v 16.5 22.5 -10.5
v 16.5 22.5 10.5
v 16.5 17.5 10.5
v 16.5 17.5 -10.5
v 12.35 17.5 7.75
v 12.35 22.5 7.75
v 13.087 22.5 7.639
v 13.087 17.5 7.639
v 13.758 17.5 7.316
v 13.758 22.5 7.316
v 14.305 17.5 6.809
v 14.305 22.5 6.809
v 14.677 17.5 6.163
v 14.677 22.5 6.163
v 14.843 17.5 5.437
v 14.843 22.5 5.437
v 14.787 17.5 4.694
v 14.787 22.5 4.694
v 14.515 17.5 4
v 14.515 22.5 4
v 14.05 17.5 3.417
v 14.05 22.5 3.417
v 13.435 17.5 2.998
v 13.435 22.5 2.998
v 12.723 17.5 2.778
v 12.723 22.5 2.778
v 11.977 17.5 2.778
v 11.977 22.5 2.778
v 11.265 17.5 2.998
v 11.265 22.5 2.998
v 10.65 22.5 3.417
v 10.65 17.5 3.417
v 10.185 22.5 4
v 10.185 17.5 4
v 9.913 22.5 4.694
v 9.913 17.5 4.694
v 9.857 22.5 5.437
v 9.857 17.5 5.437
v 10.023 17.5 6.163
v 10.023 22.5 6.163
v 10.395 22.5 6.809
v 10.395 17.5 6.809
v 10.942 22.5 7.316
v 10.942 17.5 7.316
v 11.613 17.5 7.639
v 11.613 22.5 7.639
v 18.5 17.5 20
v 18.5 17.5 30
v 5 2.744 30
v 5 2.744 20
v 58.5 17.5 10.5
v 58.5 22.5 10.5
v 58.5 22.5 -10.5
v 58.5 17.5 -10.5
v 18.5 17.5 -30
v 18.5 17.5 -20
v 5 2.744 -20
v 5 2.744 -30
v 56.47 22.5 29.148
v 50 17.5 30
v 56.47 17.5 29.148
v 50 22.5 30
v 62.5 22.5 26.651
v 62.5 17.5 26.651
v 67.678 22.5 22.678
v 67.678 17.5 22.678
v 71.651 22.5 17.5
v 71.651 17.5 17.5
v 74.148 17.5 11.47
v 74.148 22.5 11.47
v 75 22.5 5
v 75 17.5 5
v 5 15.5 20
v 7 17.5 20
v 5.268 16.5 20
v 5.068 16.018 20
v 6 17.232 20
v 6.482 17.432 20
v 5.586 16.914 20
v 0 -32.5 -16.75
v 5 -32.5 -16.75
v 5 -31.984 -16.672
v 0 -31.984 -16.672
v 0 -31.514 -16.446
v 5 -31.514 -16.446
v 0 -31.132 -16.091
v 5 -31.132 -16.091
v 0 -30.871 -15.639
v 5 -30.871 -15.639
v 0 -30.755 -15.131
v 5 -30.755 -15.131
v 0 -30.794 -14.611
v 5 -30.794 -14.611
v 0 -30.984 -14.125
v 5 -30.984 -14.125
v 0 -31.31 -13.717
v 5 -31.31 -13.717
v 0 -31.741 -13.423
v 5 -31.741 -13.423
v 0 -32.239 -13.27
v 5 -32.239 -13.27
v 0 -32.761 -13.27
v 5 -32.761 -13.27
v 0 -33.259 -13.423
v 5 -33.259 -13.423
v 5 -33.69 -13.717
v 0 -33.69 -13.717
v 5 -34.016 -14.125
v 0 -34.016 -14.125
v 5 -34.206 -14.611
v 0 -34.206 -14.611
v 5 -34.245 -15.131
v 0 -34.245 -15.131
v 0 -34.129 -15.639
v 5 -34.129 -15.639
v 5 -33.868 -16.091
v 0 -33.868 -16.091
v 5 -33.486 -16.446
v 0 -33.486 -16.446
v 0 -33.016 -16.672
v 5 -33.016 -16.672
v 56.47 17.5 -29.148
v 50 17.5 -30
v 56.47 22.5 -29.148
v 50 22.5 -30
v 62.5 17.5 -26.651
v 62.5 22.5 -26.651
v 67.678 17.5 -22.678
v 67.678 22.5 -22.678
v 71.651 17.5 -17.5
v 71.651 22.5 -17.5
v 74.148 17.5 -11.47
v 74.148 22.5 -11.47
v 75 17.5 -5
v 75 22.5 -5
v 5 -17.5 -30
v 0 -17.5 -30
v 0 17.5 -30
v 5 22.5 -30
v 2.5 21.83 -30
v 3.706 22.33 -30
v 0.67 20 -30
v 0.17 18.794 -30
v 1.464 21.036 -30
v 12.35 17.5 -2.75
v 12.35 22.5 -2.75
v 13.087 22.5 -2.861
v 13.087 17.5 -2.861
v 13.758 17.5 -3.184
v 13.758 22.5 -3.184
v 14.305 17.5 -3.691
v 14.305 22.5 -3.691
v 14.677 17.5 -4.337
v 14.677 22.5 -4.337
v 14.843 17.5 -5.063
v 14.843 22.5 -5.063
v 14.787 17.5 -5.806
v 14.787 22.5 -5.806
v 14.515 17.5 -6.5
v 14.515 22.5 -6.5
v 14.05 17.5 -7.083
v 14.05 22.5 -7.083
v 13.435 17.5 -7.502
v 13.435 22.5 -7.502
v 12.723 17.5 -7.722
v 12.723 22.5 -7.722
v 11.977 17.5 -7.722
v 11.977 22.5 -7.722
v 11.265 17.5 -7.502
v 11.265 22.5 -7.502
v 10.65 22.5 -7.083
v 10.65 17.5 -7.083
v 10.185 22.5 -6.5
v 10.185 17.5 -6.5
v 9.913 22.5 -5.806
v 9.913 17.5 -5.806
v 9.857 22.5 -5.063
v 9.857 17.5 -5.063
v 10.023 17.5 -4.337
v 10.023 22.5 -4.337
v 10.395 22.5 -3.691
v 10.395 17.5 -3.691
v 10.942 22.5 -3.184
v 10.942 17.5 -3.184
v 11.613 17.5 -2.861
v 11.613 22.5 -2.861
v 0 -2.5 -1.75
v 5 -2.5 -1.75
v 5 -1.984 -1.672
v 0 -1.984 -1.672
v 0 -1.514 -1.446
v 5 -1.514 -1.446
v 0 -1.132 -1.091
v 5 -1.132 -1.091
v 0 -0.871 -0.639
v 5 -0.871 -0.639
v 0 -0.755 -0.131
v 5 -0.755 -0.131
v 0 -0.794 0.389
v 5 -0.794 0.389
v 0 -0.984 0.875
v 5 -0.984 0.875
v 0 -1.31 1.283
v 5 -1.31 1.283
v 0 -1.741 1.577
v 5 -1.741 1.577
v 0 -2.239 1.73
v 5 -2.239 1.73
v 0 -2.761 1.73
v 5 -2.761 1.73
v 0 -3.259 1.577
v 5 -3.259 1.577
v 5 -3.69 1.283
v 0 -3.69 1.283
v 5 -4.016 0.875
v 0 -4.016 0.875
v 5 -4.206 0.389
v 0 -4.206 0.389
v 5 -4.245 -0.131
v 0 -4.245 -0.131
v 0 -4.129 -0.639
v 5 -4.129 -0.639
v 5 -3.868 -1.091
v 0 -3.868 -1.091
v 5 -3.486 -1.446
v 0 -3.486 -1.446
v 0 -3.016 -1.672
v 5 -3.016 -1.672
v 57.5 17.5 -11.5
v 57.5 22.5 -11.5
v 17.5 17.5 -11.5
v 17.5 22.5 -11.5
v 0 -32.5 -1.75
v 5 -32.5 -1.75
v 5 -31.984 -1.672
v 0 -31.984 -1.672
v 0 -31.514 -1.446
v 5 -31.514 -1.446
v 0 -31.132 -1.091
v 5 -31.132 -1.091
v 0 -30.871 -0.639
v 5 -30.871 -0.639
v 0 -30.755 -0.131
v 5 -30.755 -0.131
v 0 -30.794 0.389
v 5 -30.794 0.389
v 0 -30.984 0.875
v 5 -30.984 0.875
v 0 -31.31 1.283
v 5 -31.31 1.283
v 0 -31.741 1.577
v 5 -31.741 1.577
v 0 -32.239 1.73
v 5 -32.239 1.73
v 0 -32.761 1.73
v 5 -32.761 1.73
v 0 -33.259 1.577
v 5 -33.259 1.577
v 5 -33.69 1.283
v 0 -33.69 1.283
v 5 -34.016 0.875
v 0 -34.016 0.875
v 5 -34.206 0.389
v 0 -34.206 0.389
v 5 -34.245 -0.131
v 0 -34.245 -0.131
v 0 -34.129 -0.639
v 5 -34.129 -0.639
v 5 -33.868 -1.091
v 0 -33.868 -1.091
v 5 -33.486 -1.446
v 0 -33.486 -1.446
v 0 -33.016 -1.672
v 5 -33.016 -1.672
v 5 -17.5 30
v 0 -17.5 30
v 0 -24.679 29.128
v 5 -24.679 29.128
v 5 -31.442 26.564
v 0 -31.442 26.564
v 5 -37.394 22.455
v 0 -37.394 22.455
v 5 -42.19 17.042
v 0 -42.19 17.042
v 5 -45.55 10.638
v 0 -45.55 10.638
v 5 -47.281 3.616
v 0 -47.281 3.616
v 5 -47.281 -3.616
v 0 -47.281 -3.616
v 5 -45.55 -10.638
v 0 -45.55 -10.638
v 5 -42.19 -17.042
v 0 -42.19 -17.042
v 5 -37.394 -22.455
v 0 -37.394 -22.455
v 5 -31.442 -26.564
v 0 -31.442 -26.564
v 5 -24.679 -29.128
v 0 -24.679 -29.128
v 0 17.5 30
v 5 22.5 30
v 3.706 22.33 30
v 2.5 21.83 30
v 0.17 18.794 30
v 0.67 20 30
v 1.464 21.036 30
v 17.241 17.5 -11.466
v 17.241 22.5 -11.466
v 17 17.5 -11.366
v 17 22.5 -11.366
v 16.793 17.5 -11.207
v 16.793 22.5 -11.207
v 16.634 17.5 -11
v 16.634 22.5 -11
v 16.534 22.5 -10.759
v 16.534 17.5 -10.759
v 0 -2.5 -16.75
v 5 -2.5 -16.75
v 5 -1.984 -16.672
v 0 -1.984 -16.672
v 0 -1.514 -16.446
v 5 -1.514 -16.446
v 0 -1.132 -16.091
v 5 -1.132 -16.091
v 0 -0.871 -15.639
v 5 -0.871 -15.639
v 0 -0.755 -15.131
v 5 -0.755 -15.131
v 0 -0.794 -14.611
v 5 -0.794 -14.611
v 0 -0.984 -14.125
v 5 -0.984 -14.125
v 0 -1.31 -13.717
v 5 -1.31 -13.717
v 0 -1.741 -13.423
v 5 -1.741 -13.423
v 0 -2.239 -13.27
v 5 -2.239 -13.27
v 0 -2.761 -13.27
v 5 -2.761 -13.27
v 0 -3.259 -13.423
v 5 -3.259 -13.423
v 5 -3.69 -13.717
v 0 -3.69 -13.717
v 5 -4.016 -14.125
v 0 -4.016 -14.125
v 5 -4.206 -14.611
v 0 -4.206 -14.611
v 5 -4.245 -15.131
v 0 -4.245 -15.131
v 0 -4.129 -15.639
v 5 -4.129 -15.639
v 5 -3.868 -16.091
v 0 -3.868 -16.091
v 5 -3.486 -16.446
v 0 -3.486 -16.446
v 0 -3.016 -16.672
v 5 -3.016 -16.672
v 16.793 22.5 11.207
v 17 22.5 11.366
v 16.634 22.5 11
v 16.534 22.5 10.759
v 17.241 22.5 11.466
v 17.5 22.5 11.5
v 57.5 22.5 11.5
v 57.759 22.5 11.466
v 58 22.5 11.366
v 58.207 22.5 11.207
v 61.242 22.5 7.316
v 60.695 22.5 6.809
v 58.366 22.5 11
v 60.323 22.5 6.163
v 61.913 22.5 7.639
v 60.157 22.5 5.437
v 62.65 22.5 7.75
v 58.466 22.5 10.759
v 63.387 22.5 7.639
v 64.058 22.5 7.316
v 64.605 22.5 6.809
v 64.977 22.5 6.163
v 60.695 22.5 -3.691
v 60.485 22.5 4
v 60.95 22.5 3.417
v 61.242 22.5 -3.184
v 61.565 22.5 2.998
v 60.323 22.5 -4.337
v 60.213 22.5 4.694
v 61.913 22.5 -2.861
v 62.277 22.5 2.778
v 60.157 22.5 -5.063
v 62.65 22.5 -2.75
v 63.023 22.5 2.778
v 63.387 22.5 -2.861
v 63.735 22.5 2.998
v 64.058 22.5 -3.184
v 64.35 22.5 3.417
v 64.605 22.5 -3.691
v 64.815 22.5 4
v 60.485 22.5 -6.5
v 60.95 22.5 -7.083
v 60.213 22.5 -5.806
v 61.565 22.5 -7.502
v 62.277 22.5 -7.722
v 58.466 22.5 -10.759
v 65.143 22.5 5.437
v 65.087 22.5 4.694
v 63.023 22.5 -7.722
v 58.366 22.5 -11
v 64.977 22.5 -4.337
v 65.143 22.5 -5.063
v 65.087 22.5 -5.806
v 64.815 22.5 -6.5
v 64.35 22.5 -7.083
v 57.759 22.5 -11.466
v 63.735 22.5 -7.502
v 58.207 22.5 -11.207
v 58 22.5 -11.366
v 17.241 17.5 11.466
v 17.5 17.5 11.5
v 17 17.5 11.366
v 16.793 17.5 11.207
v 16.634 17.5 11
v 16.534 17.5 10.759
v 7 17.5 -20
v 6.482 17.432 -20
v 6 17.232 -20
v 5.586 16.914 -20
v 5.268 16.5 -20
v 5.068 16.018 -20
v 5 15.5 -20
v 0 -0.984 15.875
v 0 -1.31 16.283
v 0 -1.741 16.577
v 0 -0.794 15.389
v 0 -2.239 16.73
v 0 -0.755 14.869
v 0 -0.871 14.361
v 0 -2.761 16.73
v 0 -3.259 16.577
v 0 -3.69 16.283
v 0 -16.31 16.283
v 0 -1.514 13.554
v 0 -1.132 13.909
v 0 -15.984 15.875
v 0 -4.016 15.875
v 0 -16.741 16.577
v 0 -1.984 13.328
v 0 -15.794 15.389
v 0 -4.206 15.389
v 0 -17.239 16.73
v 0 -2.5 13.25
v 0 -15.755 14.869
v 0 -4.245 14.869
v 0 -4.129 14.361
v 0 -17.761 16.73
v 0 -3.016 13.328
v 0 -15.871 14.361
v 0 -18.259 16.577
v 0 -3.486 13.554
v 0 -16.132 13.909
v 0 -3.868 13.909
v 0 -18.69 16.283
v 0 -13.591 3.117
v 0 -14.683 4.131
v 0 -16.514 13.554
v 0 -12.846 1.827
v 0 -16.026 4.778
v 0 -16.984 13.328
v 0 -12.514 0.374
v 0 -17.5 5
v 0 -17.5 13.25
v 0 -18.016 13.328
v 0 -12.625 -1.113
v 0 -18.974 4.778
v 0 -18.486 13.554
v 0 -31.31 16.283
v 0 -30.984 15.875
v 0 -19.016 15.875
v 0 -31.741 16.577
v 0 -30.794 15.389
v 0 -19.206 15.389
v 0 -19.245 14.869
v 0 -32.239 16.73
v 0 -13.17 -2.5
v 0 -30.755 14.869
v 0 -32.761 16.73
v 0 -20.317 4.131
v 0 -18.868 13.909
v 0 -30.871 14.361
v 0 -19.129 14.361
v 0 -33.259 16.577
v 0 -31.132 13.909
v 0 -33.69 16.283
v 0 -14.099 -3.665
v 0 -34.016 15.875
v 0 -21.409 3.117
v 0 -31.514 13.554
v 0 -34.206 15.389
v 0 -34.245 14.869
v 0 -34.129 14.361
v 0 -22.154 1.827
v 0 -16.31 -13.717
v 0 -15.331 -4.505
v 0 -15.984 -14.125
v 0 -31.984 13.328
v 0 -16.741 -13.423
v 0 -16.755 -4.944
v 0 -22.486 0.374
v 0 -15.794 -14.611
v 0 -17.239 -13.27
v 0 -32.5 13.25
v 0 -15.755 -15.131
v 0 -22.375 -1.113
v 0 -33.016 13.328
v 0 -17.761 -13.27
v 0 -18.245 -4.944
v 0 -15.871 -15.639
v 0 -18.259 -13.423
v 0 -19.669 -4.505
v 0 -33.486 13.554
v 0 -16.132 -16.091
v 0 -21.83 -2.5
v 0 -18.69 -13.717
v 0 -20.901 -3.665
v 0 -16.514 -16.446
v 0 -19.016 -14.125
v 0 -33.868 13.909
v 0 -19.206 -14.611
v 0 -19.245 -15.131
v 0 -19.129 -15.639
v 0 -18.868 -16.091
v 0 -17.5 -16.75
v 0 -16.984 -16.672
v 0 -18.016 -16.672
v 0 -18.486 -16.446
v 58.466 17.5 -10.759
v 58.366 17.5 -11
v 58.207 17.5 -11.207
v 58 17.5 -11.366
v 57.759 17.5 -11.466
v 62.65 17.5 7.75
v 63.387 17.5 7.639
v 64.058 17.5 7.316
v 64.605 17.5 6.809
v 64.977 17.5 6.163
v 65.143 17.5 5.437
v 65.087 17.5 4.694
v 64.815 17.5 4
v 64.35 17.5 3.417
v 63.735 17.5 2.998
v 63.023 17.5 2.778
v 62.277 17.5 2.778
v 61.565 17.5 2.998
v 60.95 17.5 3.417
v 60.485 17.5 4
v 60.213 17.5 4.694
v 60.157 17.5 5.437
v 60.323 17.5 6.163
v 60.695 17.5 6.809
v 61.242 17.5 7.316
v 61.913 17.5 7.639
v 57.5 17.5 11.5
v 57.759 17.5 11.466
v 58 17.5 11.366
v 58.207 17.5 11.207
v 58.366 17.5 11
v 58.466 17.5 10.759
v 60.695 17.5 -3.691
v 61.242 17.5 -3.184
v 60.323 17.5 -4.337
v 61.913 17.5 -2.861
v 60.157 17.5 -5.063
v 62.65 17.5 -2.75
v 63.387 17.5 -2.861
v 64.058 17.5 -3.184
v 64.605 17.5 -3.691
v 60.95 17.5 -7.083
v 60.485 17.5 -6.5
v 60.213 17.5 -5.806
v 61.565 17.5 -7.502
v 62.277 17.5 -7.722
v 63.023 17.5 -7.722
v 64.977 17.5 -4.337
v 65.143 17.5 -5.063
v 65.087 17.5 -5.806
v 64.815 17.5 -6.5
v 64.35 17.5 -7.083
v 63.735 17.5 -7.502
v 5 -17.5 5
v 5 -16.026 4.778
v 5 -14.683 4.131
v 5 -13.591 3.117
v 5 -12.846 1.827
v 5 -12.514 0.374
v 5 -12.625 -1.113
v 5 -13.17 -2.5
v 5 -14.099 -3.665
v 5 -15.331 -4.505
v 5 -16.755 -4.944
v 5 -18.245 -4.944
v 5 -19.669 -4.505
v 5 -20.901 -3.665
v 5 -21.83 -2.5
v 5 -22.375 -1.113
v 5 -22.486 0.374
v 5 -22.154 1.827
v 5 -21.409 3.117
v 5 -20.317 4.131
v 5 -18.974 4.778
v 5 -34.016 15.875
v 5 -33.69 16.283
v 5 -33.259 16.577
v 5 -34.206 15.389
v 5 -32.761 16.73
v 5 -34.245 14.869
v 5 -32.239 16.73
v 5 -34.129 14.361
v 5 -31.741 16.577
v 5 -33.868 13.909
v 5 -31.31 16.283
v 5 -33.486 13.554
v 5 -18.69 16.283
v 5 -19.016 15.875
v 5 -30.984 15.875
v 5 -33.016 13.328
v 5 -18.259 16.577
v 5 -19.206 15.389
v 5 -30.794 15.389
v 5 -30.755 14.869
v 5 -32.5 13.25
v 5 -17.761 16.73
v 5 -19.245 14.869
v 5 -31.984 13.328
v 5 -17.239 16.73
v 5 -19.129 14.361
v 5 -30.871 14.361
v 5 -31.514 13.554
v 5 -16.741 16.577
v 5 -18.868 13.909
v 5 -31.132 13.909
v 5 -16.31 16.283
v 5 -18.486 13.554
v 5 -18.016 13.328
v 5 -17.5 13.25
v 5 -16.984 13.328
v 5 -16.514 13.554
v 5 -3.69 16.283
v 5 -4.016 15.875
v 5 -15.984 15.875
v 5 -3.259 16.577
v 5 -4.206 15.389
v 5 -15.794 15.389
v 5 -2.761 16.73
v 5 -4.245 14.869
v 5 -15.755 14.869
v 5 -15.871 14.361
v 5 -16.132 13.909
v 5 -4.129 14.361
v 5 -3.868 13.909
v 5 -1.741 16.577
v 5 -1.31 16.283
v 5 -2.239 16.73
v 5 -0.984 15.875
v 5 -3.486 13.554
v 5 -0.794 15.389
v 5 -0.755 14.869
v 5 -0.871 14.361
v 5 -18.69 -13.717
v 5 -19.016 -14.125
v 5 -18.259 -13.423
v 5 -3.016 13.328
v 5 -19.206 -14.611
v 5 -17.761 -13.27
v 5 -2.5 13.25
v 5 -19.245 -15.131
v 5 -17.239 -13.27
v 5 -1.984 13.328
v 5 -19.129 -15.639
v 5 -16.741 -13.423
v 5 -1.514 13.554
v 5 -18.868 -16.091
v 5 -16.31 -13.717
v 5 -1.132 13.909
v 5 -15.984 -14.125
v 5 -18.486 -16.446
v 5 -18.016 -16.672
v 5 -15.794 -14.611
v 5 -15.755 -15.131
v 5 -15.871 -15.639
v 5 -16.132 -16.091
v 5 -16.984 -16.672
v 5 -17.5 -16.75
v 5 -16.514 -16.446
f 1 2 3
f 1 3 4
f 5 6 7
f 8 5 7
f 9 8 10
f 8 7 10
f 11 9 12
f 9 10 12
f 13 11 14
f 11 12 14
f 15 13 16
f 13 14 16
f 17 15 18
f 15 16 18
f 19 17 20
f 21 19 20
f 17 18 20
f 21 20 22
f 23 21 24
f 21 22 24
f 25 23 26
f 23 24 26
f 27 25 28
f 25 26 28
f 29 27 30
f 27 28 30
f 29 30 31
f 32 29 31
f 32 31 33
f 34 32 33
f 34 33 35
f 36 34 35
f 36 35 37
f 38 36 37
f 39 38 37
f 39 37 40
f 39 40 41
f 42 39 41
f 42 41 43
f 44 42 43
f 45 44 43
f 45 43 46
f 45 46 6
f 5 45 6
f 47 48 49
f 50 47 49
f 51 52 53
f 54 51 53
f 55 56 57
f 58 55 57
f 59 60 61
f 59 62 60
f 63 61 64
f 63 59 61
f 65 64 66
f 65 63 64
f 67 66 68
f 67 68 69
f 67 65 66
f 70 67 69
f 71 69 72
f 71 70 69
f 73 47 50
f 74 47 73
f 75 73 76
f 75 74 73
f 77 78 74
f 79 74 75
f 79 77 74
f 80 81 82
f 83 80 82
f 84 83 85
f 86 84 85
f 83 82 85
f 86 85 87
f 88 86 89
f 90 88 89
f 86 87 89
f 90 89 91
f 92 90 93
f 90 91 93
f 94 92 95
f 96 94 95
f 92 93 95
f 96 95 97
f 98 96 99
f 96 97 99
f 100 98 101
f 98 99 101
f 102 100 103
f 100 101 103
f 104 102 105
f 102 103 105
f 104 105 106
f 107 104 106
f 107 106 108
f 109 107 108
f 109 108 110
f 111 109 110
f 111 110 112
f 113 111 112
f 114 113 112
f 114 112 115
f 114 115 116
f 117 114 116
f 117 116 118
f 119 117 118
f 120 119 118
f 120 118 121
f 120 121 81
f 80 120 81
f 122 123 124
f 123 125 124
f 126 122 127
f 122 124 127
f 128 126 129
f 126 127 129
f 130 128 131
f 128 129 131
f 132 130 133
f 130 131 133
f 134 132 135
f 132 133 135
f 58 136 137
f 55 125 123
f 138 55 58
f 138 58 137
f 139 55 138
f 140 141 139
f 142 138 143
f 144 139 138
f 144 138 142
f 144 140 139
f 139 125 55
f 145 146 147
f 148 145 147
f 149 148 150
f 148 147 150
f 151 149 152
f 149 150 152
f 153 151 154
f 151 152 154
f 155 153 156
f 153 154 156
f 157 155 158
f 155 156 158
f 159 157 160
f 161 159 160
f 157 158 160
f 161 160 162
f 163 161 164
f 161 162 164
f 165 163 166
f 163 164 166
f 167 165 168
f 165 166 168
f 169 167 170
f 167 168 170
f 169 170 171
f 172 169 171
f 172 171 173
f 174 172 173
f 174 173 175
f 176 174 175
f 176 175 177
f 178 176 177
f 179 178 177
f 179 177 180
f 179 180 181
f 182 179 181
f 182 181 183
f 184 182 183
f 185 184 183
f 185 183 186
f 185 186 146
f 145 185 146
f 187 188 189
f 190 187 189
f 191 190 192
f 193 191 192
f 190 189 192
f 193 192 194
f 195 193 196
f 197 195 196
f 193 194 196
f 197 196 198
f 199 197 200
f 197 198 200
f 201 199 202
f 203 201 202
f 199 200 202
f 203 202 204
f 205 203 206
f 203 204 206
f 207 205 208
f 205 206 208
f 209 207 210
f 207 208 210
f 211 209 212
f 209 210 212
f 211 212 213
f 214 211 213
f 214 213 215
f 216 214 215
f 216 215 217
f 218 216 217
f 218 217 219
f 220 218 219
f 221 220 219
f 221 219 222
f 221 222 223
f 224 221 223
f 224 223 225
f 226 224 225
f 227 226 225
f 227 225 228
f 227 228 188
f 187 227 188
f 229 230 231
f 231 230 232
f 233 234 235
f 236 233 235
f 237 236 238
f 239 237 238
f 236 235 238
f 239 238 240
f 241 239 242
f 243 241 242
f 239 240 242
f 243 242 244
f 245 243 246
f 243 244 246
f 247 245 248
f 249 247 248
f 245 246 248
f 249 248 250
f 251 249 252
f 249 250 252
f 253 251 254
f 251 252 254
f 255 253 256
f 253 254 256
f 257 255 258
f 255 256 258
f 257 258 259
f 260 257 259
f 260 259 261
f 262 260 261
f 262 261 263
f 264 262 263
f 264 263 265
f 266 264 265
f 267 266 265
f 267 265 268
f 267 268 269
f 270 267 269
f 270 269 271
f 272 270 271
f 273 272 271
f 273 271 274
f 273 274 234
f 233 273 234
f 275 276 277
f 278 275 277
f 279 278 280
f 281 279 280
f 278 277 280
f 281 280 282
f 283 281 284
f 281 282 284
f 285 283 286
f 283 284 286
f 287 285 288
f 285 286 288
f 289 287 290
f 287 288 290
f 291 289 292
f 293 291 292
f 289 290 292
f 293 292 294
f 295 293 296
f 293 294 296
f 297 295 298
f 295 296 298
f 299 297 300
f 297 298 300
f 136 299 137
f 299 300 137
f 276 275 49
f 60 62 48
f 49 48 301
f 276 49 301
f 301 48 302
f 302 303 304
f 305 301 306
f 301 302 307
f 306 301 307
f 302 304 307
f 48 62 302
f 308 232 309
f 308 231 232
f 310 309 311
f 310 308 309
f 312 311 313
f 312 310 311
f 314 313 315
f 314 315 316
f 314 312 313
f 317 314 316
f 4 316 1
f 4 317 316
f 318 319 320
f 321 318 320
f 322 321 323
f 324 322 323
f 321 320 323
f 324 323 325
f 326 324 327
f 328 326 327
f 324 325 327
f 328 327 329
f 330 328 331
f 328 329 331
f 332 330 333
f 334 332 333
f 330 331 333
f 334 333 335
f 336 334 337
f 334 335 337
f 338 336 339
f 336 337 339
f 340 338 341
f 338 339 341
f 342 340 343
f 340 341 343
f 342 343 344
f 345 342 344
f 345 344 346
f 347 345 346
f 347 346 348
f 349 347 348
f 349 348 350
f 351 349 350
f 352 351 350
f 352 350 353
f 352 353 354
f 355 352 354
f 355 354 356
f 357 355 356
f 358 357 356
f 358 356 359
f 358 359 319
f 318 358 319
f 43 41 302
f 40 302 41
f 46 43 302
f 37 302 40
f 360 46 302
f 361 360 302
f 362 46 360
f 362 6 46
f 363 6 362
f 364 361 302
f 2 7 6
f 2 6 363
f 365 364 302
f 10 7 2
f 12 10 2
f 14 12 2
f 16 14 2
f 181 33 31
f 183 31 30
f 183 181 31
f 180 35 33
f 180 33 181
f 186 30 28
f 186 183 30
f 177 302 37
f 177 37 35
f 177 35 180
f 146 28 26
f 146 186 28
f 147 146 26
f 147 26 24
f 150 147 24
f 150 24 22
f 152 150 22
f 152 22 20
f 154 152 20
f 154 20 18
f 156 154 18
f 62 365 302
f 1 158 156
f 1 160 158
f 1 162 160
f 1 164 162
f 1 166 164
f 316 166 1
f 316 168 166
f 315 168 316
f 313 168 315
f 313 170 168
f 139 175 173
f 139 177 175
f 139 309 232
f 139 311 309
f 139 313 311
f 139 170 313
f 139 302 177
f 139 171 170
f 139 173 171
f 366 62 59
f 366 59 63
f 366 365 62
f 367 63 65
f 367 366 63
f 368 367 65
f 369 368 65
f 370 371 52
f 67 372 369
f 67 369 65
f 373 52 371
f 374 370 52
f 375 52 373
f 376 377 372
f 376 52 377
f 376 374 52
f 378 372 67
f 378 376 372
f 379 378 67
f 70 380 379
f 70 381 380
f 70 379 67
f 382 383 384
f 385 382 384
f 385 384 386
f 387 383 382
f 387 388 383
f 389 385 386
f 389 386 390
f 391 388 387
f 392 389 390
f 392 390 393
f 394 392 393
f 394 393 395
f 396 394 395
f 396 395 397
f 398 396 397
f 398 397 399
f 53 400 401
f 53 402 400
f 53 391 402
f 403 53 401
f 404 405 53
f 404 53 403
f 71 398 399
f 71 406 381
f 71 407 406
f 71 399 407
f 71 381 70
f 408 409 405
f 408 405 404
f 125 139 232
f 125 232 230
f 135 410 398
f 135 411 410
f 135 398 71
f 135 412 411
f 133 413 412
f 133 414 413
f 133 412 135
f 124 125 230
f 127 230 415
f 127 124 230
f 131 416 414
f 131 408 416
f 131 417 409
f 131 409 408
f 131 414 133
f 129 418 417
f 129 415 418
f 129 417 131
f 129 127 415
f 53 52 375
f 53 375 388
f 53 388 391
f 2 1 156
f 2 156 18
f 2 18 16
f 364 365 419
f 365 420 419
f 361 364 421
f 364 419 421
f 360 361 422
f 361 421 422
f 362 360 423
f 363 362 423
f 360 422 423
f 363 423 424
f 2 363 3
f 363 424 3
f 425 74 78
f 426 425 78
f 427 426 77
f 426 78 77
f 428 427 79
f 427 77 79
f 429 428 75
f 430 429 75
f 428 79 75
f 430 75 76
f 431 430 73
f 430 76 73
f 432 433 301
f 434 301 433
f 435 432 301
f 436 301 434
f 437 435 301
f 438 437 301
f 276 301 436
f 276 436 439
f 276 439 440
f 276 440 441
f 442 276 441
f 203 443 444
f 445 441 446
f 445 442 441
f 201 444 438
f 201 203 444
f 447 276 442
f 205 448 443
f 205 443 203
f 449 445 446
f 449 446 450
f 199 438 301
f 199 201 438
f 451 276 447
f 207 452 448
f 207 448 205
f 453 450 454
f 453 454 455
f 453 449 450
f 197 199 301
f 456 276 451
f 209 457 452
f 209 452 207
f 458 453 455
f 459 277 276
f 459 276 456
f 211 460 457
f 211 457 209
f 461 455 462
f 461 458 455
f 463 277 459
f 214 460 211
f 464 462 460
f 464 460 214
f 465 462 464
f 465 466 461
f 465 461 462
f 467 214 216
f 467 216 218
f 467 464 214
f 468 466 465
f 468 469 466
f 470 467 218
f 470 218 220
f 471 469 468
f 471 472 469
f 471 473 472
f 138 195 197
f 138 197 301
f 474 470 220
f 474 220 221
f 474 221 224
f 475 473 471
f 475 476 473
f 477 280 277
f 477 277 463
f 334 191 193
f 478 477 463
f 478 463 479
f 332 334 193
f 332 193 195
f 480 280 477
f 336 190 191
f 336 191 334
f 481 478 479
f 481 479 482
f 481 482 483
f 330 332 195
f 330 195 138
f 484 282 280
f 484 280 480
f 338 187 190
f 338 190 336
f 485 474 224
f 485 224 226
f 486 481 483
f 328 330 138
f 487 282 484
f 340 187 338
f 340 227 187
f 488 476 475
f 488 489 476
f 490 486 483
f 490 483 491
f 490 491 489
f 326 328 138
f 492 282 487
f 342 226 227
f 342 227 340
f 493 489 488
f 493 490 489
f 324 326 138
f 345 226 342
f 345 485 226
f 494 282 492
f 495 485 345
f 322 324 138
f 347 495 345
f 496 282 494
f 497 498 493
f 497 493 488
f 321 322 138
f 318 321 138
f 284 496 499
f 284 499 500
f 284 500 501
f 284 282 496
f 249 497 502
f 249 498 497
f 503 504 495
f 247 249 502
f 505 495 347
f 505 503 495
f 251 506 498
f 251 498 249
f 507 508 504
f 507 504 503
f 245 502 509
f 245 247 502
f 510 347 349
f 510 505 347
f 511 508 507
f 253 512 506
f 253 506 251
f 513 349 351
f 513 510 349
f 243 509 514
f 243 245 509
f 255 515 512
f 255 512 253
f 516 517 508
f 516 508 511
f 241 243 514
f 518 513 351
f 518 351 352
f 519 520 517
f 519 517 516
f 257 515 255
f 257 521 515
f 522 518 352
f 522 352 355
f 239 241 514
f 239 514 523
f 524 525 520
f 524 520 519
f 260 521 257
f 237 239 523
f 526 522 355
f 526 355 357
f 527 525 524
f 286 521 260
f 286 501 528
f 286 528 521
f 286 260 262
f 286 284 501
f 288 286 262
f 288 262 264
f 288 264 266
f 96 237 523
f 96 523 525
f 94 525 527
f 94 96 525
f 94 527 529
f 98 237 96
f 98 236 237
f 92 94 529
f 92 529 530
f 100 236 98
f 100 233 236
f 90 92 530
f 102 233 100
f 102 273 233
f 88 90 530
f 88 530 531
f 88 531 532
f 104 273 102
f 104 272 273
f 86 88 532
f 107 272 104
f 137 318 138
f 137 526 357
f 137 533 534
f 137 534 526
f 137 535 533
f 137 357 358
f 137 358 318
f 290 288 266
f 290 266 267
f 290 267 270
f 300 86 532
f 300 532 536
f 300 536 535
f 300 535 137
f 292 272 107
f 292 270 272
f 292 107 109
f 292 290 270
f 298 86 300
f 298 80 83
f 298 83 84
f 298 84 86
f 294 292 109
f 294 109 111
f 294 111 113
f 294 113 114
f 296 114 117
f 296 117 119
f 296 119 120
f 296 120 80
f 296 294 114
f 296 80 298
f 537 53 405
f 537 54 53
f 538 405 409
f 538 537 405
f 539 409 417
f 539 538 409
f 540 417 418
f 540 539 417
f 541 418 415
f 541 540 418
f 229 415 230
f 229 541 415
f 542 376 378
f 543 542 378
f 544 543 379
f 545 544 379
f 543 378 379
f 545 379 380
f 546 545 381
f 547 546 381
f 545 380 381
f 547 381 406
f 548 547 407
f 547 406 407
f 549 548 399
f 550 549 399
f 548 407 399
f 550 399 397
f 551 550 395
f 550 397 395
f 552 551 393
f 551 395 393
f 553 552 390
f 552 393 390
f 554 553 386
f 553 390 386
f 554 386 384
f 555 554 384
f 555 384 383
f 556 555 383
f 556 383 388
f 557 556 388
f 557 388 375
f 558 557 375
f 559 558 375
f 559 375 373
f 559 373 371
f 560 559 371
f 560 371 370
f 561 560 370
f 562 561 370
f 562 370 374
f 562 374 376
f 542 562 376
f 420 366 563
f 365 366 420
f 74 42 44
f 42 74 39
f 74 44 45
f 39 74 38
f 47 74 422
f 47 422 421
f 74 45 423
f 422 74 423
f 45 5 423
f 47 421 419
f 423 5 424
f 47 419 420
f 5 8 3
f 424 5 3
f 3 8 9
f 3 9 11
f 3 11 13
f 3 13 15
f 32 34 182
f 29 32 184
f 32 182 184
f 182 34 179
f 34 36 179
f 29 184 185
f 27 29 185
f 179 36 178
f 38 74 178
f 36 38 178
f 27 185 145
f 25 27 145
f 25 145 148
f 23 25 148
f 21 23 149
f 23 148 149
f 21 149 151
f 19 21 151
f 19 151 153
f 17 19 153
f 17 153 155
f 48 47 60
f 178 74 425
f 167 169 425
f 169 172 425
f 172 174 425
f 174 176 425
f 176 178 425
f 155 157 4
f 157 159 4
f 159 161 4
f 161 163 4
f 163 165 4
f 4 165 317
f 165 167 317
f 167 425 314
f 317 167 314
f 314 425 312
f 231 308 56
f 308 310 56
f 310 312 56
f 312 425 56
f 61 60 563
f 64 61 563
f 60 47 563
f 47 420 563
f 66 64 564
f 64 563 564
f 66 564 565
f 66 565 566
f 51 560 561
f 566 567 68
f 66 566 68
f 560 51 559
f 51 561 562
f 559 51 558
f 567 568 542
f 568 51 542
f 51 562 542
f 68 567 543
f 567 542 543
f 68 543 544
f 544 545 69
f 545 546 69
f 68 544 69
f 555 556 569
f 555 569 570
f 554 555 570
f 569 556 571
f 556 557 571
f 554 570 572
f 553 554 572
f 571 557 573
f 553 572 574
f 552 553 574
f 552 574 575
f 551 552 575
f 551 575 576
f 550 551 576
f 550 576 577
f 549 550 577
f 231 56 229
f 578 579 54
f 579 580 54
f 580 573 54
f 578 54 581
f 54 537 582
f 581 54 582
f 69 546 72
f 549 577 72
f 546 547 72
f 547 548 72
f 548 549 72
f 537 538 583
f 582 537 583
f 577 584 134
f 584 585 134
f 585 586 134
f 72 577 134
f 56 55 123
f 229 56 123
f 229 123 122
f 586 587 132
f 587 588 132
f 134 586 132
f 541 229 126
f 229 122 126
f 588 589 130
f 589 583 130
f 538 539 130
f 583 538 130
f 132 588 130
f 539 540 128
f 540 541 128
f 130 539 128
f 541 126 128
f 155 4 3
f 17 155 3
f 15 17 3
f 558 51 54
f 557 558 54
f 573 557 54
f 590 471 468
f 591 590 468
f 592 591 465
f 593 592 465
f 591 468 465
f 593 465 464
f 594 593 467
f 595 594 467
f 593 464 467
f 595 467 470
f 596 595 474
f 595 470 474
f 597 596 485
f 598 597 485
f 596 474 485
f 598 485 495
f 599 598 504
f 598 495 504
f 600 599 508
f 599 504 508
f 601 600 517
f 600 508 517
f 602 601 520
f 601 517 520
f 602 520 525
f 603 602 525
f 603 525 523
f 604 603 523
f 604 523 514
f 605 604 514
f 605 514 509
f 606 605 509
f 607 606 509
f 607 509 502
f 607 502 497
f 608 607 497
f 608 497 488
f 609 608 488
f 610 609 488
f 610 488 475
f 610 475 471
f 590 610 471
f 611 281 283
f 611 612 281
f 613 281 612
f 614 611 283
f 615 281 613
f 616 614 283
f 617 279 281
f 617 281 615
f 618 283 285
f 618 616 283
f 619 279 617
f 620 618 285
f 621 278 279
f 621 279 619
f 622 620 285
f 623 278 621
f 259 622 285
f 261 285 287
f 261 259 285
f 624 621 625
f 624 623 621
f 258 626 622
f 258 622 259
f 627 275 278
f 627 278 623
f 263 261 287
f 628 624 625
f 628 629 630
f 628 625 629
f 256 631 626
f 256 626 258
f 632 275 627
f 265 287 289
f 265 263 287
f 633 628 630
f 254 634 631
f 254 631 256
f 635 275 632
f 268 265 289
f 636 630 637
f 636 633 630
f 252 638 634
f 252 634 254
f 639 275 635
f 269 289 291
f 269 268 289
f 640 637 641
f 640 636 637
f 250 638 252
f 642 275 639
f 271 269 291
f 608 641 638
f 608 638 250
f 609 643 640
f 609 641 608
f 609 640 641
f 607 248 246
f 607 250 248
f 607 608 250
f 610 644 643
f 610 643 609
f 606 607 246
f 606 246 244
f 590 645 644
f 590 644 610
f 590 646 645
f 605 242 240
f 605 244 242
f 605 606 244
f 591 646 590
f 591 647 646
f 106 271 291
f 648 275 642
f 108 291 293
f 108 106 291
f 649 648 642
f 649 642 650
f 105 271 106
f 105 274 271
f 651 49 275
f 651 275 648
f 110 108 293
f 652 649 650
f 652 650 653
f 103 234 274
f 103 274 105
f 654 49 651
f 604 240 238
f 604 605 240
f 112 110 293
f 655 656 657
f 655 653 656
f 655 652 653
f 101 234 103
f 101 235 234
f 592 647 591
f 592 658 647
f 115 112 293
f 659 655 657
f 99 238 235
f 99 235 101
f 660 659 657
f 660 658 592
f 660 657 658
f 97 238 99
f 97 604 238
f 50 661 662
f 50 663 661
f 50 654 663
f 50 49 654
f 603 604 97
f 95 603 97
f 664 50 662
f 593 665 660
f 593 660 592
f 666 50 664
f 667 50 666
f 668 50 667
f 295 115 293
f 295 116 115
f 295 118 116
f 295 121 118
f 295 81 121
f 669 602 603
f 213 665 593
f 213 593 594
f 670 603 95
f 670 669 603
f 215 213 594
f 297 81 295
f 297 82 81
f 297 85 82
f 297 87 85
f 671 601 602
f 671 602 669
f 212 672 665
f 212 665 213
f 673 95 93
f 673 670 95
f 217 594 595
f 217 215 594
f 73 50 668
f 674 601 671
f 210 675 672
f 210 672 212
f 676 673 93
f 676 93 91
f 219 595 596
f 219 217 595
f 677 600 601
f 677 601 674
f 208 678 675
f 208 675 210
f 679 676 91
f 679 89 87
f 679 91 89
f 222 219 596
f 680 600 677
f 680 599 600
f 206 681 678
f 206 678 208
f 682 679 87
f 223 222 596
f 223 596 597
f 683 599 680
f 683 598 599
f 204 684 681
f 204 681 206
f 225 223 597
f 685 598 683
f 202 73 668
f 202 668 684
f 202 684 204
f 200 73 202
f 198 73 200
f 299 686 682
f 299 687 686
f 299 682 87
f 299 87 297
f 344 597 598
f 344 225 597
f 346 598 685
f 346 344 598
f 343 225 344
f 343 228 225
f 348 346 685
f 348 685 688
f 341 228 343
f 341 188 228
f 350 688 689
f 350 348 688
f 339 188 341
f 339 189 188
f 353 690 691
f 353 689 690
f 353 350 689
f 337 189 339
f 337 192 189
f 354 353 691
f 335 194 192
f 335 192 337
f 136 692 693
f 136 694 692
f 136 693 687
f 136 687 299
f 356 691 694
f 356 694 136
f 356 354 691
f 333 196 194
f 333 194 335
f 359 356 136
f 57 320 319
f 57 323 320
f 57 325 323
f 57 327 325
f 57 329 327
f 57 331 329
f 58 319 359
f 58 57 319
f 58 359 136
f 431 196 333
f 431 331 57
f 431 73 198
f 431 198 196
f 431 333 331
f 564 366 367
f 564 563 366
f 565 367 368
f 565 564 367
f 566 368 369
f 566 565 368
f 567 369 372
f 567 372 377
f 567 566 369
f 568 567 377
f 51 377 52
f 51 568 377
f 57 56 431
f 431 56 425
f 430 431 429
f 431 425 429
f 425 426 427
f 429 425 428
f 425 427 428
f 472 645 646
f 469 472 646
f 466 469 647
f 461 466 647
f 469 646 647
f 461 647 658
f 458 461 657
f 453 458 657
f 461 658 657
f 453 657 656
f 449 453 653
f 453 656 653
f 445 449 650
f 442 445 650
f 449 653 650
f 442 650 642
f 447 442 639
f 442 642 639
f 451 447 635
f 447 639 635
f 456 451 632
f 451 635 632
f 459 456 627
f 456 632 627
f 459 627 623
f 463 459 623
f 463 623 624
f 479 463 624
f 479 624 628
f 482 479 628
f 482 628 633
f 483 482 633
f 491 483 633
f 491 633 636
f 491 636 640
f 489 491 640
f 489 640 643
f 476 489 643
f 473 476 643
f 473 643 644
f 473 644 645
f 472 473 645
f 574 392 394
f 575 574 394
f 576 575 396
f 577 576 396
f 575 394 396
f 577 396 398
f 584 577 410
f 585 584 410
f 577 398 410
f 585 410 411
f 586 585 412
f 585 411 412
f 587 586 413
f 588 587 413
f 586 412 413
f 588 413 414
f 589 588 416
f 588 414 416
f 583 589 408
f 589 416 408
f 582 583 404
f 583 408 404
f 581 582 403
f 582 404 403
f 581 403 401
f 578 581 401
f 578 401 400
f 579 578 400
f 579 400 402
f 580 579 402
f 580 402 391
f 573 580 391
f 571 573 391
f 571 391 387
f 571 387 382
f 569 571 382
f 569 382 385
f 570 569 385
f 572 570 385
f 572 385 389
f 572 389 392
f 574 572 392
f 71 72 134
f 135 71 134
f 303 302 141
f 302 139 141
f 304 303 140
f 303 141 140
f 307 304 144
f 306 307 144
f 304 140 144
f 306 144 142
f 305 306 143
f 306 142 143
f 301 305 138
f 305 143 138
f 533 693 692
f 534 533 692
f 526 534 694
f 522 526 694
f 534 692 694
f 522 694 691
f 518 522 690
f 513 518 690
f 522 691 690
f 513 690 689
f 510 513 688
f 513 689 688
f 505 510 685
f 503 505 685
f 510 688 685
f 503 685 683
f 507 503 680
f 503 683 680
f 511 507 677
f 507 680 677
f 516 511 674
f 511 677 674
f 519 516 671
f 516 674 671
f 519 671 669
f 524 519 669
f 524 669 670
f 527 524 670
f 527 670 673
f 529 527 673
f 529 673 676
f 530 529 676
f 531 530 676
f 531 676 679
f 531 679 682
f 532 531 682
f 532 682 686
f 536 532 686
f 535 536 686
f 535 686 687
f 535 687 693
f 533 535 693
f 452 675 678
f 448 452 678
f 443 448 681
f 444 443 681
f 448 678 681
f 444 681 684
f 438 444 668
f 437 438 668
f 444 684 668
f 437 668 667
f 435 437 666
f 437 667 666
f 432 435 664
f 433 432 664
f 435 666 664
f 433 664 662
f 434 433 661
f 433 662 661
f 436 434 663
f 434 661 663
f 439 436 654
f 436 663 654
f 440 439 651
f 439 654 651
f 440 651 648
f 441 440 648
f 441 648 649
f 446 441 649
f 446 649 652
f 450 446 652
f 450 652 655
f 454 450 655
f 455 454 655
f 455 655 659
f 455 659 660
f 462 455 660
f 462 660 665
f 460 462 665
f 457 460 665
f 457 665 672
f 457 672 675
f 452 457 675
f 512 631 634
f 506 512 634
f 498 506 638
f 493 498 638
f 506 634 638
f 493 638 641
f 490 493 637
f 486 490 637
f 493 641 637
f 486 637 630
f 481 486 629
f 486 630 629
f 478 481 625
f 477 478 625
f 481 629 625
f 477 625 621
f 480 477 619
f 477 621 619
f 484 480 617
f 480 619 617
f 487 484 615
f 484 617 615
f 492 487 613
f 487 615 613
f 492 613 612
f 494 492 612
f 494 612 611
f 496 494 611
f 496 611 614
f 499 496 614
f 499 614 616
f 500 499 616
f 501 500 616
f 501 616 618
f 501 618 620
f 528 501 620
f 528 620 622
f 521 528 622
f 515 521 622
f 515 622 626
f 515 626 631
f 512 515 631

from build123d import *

# Parameters (mm, degrees)
BOSS_EXTRUDE1_DEPTH = 5
CUT_EXTRUDE1_REACH  = 58.403
SKETCH2_R           = 1.75
SKETCH4_W           = 75
SKETCH4_H           = 60
BOSS_EXTRUDE2_DEPTH = 5
CUT_EXTRUDE2_REACH  = 90.459
SKETCH3_R           = 2.5
SKETCH3_W           = 23
SKETCH3_H           = 42
FILLET1_R           = 25
FILLET2_R           = 5
FILLET3_R           = 2
FILLET4_R           = 1
BOSS_EXTRUDE3_DEPTH = 10
LPATTERN1_COUNT     = 2
LPATTERN1_PITCH     = 50
CUT_EXTRUDE3_REACH  = 95.708
SKETCH7_R           = 5


with BuildPart() as part:
    # Sketch1 → Boss-Extrude1 (new body)
    with BuildSketch(Plane(origin=(0, 0, 0), x_dir=(0, 0, -1), z_dir=(1, 0, 0))):
        with BuildLine():
            ThreePointArc((-30, -17.5), (0, -47.5), (30, -17.5))
            Line((30, -17.5), (30, 17.5))
            Line((30, 17.5), (-30, 17.5))
            Line((-30, 17.5), (-30, -17.5))
        make_face()
    extrude(amount=BOSS_EXTRUDE1_DEPTH)

    # Sketch2 → Cut-Extrude1 (cut, up to next)
    with BuildSketch(Plane(origin=(5, 0, 0), x_dir=(0, 0, -1), z_dir=(1, 0, 0)), mode=Mode.PRIVATE) as cut_extrude1_sk1:
        with Locations((-15, -32.5)):
            Circle(SKETCH2_R)
    cut_extrude1_tool1 = extrude(cut_extrude1_sk1.sketch, amount=-CUT_EXTRUDE1_REACH, mode=Mode.PRIVATE) & part.part
    # Sketch2 → Cut-Extrude1 (cut, up to next)
    with BuildSketch(Plane(origin=(5, 0, 0), x_dir=(0, 0, -1), z_dir=(1, 0, 0)), mode=Mode.PRIVATE) as cut_extrude1_sk2:
        with Locations((15, -32.5)):
            Circle(SKETCH2_R)
    cut_extrude1_tool2 = extrude(cut_extrude1_sk2.sketch, amount=-CUT_EXTRUDE1_REACH, mode=Mode.PRIVATE) & part.part
    # Sketch2 → Cut-Extrude1 (cut, up to next)
    with BuildSketch(Plane(origin=(5, 0, 0), x_dir=(0, 0, -1), z_dir=(1, 0, 0)), mode=Mode.PRIVATE) as cut_extrude1_sk3:
        with Locations((-15, -2.5)):
            Circle(SKETCH2_R)
    cut_extrude1_tool3 = extrude(cut_extrude1_sk3.sketch, amount=-CUT_EXTRUDE1_REACH, mode=Mode.PRIVATE) & part.part
    # Sketch2 → Cut-Extrude1 (cut, up to next)
    with BuildSketch(Plane(origin=(5, 0, 0), x_dir=(0, 0, -1), z_dir=(1, 0, 0)), mode=Mode.PRIVATE) as cut_extrude1_sk4:
        with Locations((0, -2.5)):
            Circle(SKETCH2_R)
    cut_extrude1_tool4 = extrude(cut_extrude1_sk4.sketch, amount=-CUT_EXTRUDE1_REACH, mode=Mode.PRIVATE) & part.part
    # Sketch2 → Cut-Extrude1 (cut, up to next)
    with BuildSketch(Plane(origin=(5, 0, 0), x_dir=(0, 0, -1), z_dir=(1, 0, 0)), mode=Mode.PRIVATE) as cut_extrude1_sk5:
        with Locations((15, -2.5)):
            Circle(SKETCH2_R)
    cut_extrude1_tool5 = extrude(cut_extrude1_sk5.sketch, amount=-CUT_EXTRUDE1_REACH, mode=Mode.PRIVATE) & part.part
    # Sketch2 → Cut-Extrude1 (cut, up to next)
    with BuildSketch(Plane(origin=(5, 0, 0), x_dir=(0, 0, -1), z_dir=(1, 0, 0)), mode=Mode.PRIVATE) as cut_extrude1_sk6:
        with Locations((0, -32.5)):
            Circle(SKETCH2_R)
    cut_extrude1_tool6 = extrude(cut_extrude1_sk6.sketch, amount=-CUT_EXTRUDE1_REACH, mode=Mode.PRIVATE) & part.part
    # Sketch2 → Cut-Extrude1 (cut, up to next)
    with BuildSketch(Plane(origin=(5, 0, 0), x_dir=(0, 0, -1), z_dir=(1, 0, 0)), mode=Mode.PRIVATE) as cut_extrude1_sk7:
        with Locations((-15, -17.5)):
            Circle(SKETCH2_R)
    cut_extrude1_tool7 = extrude(cut_extrude1_sk7.sketch, amount=-CUT_EXTRUDE1_REACH, mode=Mode.PRIVATE) & part.part
    # Sketch2 → Cut-Extrude1 (cut, up to next)
    with BuildSketch(Plane(origin=(5, 0, 0), x_dir=(0, 0, -1), z_dir=(1, 0, 0)), mode=Mode.PRIVATE) as cut_extrude1_sk8:
        with Locations((15, -17.5)):
            Circle(SKETCH2_R)
    cut_extrude1_tool8 = extrude(cut_extrude1_sk8.sketch, amount=-CUT_EXTRUDE1_REACH, mode=Mode.PRIVATE) & part.part
    add(cut_extrude1_tool1.solids().sort_by_distance((5, -32.5, 15))[0], mode=Mode.SUBTRACT)
    add(cut_extrude1_tool2.solids().sort_by_distance((5, -32.5, -15))[0], mode=Mode.SUBTRACT)
    add(cut_extrude1_tool3.solids().sort_by_distance((5, -2.5, 15))[0], mode=Mode.SUBTRACT)
    add(cut_extrude1_tool4.solids().sort_by_distance((5, -2.5, 0))[0], mode=Mode.SUBTRACT)
    add(cut_extrude1_tool5.solids().sort_by_distance((5, -2.5, -15))[0], mode=Mode.SUBTRACT)
    add(cut_extrude1_tool6.solids().sort_by_distance((5, -32.5, 0))[0], mode=Mode.SUBTRACT)
    add(cut_extrude1_tool7.solids().sort_by_distance((5, -17.5, 15))[0], mode=Mode.SUBTRACT)
    add(cut_extrude1_tool8.solids().sort_by_distance((5, -17.5, -15))[0], mode=Mode.SUBTRACT)

    # Sketch4 → Boss-Extrude2 (add)
    with BuildSketch(Plane(origin=(0, 17.5, 0), x_dir=(1, 0, 0), z_dir=(0, 1, 0))):
        with Locations((37.5, 0)):
            Rectangle(SKETCH4_W, SKETCH4_H)
    extrude(amount=BOSS_EXTRUDE2_DEPTH)

    # Sketch3 → Cut-Extrude2 (cut, up to next)
    with BuildSketch(Plane(origin=(30, 22.5, 0), x_dir=(0, 0, -1), z_dir=(0, 1, 0)), mode=Mode.PRIVATE) as cut_extrude2_sk1:
        with Locations((-5.25, 17.65)):
            Circle(SKETCH3_R)
    cut_extrude2_tool1 = extrude(cut_extrude2_sk1.sketch, amount=-CUT_EXTRUDE2_REACH, mode=Mode.PRIVATE) & part.part
    # Sketch3 → Cut-Extrude2 (cut, up to next)
    with BuildSketch(Plane(origin=(30, 22.5, 0), x_dir=(0, 0, -1), z_dir=(0, 1, 0)), mode=Mode.PRIVATE) as cut_extrude2_sk2:
        with Locations((5.25, 17.65)):
            Circle(SKETCH3_R)
    cut_extrude2_tool2 = extrude(cut_extrude2_sk2.sketch, amount=-CUT_EXTRUDE2_REACH, mode=Mode.PRIVATE) & part.part
    # Sketch3 → Cut-Extrude2 (cut, up to next)
    with BuildSketch(Plane(origin=(30, 22.5, 0), x_dir=(0, 0, -1), z_dir=(0, 1, 0)), mode=Mode.PRIVATE) as cut_extrude2_sk3:
        with Locations((5.25, -32.65)):
            Circle(SKETCH3_R)
    cut_extrude2_tool3 = extrude(cut_extrude2_sk3.sketch, amount=-CUT_EXTRUDE2_REACH, mode=Mode.PRIVATE) & part.part
    # Sketch3 → Cut-Extrude2 (cut, up to next)
    with BuildSketch(Plane(origin=(30, 22.5, 0), x_dir=(0, 0, -1), z_dir=(0, 1, 0)), mode=Mode.PRIVATE) as cut_extrude2_sk4:
        with Locations((-5.25, -32.65)):
            Circle(SKETCH3_R)
    cut_extrude2_tool4 = extrude(cut_extrude2_sk4.sketch, amount=-CUT_EXTRUDE2_REACH, mode=Mode.PRIVATE) & part.part
    # Sketch3 → Cut-Extrude2 (cut, up to next)
    with BuildSketch(Plane(origin=(30, 22.5, 0), x_dir=(0, 0, -1), z_dir=(0, 1, 0)), mode=Mode.PRIVATE) as cut_extrude2_sk5:
        with Locations((0, -7.5)):
            Rectangle(SKETCH3_W, SKETCH3_H)
    cut_extrude2_tool5 = extrude(cut_extrude2_sk5.sketch, amount=-CUT_EXTRUDE2_REACH, mode=Mode.PRIVATE) & part.part
    add(cut_extrude2_tool1.solids().sort_by_distance((12.35, 22.5, 5.25))[0], mode=Mode.SUBTRACT)
    add(cut_extrude2_tool2.solids().sort_by_distance((12.35, 22.5, -5.25))[0], mode=Mode.SUBTRACT)
    add(cut_extrude2_tool3.solids().sort_by_distance((62.65, 22.5, -5.25))[0], mode=Mode.SUBTRACT)
    add(cut_extrude2_tool4.solids().sort_by_distance((62.65, 22.5, 5.25))[0], mode=Mode.SUBTRACT)
    add(cut_extrude2_tool5.solids().sort_by_distance((37.5, 22.5, 0))[0], mode=Mode.SUBTRACT)

    # Fillet1
    fillet1_edges = [part.edges().sort_by_distance(p)[0] for p in [
        (75, 20, -30),
        (75, 20, 30),
    ]]
    fillet(fillet1_edges, radius=FILLET1_R)

    # Fillet2
    fillet2_edges = [part.edges().sort_by_distance(p)[0] for p in [
        (0, 22.5, 0),
    ]]
    fillet(fillet2_edges, radius=FILLET2_R)

    # Fillet3
    fillet3_edges = [part.edges().sort_by_distance(p)[0] for p in [
        (5, 17.5, 0),
    ]]
    fillet(fillet3_edges, radius=FILLET3_R)

    # Fillet4
    fillet4_edges = [part.edges().sort_by_distance(p)[0] for p in [
        (16.5, 20, -11.5),
        (58.5, 20, -11.5),
        (58.5, 20, 11.5),
        (16.5, 20, 11.5),
    ]]
    fillet(fillet4_edges, radius=FILLET4_R)

    # Sketch6 → Boss-Extrude3 (add)
    with BuildSketch(Plane.XY.offset(30)):
        Polygon((18.5, 17.5), (5, 2.743645437), (5, 17.5), align=None)
    boss_extrude3 = extrude(amount=-BOSS_EXTRUDE3_DEPTH)

    # LPattern1: Boss-Extrude3 ×2
    with Locations(*[(0, 0, -i * LPATTERN1_PITCH) for i in range(1, LPATTERN1_COUNT)]):
        add(boss_extrude3)

    # Sketch7 → Cut-Extrude3 (cut, up to next)
    with BuildSketch(Plane.ZY, mode=Mode.PRIVATE) as cut_extrude3_sk1:
        with Locations((0, -17.5)):
            Circle(SKETCH7_R)
    cut_extrude3_tool1 = extrude(cut_extrude3_sk1.sketch, amount=-CUT_EXTRUDE3_REACH, mode=Mode.PRIVATE) & part.part
    add(cut_extrude3_tool1.solids().sort_by_distance((0, -17.5, 0))[0], mode=Mode.SUBTRACT)


solid = part.part
